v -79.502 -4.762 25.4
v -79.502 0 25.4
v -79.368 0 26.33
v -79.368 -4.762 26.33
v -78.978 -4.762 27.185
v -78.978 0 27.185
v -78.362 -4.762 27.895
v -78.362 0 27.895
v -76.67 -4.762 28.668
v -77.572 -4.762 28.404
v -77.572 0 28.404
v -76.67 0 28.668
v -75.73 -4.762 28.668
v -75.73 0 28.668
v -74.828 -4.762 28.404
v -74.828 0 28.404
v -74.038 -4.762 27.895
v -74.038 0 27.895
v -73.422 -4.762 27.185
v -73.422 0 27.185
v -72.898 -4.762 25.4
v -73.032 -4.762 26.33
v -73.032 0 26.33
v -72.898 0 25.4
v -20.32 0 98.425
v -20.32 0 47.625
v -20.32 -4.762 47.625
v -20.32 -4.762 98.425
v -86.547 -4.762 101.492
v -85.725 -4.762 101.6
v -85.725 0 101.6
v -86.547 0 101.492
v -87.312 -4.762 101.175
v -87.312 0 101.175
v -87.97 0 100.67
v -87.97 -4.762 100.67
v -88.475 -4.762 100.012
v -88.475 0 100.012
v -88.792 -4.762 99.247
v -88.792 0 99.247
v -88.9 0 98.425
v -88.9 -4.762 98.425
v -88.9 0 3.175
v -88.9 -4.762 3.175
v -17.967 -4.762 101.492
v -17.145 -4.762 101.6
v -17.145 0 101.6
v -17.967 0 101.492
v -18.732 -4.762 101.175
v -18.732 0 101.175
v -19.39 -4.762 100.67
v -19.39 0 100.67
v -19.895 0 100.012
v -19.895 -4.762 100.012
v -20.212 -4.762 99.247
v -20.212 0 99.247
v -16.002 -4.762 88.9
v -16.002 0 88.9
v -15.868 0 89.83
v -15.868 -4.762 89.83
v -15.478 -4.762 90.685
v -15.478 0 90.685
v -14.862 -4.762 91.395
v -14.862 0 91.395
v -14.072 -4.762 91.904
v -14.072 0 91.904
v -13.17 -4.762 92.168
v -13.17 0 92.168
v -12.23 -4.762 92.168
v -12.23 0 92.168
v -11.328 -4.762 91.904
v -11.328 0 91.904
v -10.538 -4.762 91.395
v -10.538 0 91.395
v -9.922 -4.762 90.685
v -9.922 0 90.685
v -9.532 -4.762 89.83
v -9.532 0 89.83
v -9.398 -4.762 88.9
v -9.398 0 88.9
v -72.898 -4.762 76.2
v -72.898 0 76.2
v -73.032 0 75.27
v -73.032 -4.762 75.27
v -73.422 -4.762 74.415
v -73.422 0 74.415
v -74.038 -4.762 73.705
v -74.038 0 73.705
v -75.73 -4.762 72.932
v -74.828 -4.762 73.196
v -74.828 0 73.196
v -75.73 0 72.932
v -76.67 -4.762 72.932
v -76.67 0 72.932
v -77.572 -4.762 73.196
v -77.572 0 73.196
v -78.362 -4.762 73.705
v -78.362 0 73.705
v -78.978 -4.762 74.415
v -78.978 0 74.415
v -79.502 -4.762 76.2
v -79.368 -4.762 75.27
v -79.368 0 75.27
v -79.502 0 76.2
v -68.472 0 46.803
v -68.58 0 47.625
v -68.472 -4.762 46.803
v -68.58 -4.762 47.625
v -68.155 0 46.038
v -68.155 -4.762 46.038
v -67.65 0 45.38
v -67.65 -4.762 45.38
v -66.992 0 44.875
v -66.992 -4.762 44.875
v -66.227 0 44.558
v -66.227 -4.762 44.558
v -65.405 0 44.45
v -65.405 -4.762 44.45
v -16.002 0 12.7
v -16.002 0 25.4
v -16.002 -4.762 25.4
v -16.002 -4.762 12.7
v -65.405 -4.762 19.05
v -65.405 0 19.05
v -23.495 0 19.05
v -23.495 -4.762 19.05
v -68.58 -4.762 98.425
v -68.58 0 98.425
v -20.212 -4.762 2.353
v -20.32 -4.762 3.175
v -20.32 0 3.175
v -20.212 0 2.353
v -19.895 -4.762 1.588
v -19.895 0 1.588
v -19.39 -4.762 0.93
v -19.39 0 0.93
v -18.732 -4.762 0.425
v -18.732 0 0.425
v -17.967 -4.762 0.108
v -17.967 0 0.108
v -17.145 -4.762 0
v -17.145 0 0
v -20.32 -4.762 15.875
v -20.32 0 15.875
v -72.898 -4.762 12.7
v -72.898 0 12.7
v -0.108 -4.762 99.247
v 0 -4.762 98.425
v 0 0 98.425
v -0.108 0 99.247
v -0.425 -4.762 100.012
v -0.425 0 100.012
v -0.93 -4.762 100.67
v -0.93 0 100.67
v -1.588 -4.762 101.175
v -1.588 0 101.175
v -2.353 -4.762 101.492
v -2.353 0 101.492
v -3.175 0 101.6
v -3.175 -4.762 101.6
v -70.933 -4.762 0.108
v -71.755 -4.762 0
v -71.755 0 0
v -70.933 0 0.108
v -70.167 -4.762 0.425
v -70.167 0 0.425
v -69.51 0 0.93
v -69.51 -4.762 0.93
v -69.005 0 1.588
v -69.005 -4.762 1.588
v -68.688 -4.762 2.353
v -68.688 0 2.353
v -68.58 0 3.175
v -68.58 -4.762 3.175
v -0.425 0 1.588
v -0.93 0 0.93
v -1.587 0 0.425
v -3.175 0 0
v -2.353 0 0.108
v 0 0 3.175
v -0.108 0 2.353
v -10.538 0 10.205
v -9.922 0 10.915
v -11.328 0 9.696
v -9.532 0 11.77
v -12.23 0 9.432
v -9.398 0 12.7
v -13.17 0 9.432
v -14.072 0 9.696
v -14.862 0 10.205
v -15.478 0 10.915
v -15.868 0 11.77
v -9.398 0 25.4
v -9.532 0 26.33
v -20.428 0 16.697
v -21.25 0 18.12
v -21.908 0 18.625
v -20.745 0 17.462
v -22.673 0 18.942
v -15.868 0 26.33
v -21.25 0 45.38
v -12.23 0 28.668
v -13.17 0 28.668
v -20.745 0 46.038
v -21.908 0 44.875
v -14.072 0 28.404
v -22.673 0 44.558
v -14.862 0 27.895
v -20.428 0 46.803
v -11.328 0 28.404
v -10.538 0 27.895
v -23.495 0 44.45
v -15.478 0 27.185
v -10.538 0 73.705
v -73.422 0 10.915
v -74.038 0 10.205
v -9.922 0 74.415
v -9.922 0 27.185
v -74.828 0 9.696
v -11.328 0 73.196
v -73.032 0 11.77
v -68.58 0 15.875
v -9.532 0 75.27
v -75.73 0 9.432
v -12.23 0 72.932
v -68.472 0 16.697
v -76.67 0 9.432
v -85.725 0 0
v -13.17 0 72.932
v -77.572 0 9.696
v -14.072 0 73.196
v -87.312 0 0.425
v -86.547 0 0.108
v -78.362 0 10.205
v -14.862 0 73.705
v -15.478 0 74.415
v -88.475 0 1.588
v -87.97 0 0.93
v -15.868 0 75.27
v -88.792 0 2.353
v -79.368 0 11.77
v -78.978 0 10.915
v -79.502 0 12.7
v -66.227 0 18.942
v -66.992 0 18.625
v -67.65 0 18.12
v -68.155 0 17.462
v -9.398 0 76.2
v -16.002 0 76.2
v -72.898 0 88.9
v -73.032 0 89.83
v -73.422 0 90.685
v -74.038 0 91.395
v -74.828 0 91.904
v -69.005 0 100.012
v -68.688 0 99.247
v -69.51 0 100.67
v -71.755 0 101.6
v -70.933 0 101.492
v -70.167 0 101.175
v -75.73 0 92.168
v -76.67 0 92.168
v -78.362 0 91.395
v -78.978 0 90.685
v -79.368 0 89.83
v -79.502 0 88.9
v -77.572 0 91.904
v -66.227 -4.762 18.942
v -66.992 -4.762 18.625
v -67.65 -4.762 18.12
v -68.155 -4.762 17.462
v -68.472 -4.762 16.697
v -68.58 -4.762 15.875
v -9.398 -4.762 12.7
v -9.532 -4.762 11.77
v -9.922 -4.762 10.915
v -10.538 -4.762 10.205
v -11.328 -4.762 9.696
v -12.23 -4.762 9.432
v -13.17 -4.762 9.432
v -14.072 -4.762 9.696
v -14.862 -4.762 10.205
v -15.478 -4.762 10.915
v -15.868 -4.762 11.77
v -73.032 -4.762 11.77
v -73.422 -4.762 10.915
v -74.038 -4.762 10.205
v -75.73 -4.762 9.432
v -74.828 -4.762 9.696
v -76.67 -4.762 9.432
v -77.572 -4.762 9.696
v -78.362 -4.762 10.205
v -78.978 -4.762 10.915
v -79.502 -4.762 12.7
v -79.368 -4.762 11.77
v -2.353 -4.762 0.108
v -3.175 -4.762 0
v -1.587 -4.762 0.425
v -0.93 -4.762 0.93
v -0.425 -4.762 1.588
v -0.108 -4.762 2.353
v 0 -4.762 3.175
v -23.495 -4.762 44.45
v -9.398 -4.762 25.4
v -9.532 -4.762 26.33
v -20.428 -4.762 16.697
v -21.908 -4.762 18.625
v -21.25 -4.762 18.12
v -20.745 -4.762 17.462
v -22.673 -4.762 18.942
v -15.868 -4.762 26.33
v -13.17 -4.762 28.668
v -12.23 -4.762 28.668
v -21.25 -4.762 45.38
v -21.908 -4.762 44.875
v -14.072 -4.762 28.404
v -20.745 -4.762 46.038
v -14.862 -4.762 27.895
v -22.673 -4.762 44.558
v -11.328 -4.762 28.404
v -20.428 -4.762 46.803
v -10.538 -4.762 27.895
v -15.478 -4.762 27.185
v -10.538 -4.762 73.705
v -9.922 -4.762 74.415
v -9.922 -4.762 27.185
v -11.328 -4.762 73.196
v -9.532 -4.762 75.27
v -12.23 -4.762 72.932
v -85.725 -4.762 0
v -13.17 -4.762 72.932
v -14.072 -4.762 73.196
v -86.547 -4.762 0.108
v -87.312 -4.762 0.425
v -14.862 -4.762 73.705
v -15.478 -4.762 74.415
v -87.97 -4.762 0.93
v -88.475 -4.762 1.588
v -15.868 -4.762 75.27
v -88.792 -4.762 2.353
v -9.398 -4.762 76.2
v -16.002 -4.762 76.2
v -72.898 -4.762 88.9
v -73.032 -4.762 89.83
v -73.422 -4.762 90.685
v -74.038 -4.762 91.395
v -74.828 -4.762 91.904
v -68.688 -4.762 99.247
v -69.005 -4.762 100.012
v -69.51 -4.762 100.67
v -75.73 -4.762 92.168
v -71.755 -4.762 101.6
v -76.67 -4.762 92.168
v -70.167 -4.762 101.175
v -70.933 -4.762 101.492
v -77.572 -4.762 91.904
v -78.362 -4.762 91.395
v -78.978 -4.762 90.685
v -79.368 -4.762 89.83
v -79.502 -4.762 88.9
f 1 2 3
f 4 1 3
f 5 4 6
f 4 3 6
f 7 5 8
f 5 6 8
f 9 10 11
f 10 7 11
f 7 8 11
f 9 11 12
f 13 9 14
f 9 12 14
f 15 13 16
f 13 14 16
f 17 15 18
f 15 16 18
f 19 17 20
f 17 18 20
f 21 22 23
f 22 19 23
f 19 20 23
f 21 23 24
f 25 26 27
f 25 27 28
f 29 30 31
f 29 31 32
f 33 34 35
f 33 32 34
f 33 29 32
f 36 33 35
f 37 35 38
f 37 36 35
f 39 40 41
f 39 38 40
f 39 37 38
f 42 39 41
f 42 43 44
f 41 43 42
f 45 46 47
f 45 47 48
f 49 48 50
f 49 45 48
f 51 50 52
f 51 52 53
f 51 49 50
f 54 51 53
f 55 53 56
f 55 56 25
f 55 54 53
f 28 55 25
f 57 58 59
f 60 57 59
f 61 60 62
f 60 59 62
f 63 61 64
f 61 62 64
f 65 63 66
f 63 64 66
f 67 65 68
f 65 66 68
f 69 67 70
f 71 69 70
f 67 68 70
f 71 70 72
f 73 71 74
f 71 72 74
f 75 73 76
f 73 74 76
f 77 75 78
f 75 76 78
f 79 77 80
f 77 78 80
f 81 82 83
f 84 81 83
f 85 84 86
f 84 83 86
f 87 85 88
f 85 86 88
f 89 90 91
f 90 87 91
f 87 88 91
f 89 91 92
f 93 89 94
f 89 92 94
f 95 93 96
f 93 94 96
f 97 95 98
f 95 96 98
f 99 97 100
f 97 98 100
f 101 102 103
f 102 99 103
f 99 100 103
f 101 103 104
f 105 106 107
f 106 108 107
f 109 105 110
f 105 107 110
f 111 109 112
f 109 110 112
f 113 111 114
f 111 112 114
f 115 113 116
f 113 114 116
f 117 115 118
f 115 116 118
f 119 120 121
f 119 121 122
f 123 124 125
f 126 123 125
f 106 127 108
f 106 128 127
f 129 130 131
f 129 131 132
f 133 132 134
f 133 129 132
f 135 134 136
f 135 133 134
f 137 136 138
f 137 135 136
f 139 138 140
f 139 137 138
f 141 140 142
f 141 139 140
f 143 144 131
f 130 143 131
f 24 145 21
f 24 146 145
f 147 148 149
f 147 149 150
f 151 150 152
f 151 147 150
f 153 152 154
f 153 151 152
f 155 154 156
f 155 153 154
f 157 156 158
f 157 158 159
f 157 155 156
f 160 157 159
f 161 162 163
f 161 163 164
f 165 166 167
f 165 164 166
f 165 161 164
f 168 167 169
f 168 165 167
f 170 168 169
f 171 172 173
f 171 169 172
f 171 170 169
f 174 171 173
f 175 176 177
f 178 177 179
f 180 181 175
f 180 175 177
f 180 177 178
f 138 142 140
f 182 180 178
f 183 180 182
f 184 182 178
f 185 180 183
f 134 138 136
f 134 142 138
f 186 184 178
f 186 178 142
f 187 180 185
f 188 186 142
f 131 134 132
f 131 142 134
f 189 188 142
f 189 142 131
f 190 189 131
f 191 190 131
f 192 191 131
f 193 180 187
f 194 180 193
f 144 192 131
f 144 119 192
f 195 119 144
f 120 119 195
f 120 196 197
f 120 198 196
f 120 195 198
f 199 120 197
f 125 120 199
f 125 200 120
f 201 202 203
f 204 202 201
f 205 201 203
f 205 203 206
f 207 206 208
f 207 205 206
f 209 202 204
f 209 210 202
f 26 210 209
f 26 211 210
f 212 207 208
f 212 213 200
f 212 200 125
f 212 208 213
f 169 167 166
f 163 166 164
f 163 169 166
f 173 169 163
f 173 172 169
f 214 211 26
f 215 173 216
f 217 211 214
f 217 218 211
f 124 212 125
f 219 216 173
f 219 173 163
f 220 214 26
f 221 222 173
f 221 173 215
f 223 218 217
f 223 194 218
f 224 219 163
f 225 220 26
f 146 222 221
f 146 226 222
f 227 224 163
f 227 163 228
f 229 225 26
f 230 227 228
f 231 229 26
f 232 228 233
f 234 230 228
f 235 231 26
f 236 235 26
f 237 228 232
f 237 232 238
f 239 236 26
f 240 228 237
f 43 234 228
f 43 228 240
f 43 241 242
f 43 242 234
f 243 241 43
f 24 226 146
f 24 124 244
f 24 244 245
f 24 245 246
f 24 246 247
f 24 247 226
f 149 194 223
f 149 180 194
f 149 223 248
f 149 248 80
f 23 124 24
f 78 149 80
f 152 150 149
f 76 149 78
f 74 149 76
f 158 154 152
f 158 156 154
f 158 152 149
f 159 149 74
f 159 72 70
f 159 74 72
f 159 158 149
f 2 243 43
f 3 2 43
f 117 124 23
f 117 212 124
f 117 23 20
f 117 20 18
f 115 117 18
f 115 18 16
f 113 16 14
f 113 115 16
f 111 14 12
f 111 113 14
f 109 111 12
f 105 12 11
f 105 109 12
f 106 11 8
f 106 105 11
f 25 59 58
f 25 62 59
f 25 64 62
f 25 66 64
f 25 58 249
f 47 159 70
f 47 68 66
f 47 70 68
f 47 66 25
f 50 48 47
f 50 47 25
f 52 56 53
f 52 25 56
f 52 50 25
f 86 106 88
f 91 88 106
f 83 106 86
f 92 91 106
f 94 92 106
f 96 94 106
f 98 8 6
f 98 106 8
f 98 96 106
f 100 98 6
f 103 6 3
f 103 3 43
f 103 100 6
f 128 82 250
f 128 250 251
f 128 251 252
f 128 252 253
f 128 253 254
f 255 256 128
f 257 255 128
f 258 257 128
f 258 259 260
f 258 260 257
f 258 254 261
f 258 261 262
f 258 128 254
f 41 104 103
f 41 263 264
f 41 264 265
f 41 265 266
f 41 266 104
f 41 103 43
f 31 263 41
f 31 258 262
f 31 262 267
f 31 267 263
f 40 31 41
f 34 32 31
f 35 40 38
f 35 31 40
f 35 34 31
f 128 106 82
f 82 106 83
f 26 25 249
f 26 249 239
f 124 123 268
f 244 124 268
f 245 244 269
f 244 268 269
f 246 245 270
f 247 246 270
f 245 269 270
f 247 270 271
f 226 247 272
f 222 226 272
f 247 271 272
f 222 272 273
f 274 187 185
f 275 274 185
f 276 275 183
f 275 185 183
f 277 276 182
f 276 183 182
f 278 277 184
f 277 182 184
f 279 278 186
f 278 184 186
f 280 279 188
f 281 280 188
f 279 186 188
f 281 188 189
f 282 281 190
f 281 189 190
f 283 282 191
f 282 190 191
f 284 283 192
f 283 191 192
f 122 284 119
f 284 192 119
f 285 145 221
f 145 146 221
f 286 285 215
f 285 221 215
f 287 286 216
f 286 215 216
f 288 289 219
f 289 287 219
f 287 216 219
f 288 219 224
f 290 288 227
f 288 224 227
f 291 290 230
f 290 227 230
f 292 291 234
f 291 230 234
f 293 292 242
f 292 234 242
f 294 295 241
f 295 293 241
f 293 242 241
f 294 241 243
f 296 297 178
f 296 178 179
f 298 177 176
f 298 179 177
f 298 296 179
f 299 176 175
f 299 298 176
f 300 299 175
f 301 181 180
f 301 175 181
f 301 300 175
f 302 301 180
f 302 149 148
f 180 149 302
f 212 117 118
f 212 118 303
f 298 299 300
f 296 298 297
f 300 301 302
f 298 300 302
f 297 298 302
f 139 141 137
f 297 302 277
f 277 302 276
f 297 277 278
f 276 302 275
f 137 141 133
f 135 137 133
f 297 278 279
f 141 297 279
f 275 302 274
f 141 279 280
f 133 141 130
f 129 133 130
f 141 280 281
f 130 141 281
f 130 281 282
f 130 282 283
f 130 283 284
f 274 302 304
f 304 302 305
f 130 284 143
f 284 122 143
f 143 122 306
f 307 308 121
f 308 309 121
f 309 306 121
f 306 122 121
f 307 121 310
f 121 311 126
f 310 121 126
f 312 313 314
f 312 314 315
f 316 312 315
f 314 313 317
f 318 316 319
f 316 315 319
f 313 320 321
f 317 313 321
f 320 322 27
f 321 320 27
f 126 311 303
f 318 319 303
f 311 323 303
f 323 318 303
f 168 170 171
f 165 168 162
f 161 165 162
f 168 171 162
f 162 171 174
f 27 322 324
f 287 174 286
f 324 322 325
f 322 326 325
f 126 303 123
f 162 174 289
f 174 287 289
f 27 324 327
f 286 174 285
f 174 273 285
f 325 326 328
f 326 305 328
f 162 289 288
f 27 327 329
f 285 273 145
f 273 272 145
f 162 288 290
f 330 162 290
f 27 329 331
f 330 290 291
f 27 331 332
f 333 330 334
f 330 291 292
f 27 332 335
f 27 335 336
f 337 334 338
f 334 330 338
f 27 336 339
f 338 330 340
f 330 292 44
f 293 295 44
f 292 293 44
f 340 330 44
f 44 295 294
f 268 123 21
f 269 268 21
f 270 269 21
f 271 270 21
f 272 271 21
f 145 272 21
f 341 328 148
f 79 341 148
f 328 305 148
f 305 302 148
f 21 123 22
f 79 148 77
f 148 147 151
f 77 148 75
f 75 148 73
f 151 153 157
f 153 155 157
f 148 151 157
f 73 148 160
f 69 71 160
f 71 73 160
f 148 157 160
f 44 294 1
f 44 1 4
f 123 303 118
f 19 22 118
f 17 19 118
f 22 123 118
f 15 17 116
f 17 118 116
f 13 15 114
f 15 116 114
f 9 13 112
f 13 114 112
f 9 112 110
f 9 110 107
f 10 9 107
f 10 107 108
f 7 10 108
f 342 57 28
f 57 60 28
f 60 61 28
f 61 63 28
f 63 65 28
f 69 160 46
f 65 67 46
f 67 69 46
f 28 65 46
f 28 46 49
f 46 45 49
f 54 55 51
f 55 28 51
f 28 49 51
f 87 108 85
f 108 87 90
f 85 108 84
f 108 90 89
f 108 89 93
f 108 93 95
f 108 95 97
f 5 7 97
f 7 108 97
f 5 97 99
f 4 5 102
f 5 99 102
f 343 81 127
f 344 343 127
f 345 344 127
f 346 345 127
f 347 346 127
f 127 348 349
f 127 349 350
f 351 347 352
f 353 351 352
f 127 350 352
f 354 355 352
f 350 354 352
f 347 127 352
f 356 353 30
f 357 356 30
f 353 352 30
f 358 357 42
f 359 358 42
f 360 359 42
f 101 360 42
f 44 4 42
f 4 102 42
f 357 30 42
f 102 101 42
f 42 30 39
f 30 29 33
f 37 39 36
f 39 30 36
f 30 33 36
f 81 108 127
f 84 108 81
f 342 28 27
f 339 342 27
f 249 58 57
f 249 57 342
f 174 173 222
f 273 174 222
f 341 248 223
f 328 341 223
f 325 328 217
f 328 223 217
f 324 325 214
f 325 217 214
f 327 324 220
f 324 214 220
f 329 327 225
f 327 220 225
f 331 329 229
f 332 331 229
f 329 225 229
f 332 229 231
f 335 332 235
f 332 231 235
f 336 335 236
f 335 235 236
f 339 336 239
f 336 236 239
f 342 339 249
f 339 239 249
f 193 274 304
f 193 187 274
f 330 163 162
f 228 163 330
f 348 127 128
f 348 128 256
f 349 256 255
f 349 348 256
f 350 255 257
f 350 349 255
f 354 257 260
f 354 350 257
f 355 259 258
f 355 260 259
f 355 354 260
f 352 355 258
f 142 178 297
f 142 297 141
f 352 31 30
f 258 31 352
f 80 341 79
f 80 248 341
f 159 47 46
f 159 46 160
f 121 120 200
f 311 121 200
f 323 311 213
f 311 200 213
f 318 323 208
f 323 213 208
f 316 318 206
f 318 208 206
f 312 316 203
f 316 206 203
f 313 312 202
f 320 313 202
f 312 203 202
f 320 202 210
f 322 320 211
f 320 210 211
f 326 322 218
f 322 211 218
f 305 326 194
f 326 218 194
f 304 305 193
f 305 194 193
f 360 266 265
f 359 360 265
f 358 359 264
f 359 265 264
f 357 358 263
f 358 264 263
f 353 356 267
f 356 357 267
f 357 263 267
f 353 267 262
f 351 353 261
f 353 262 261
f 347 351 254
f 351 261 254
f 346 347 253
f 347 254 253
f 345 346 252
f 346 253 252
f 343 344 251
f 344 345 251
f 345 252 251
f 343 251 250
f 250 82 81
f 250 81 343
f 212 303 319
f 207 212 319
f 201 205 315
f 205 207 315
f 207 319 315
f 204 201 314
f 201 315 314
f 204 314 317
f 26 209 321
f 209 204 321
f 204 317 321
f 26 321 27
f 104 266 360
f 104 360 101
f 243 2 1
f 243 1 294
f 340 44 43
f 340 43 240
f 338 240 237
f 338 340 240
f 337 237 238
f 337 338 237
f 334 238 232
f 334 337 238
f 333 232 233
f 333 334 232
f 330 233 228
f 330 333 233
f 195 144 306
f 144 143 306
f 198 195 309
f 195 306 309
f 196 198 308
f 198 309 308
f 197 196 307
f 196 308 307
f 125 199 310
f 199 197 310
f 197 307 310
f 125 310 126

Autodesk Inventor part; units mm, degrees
ref_plane "YZ Plane" through (0, 0, 0) normal (1, 0, 0) x (0, 1, 0)
ref_plane "XZ Plane" through (0, 0, 0) normal (0, 1, 0) x (-1, 0, 0)
ref_plane "XY Plane" through (0, 0, 0) normal (0, 0, 1) x (1, 0, 0)
sketch "Sketch1" plane through (0, 0, 0) normal (0, 1, 0) x (-1, 0, 0)
  line L0 (0, 0) -> (20.32, 0)
  line L1 (0, 101.6) -> (0, 0)
  line L2 (44.45, 44.45) -> (20.32, 44.45)
  line L3 (20.32, 44.45) -> (20.32, 101.6)
  line L4 (44.45, 44.45) -> (44.45, 19.05)
  line L5 (20.32, 101.6) -> (0, 101.6)
  line L6 (16.002, 88.9) -> (16.002, 76.2)
  line L7 (9.398, 76.2) -> (9.398, 88.9)
  arc A0 (16.002, 88.9) -> (9.398, 88.9) centre (12.7, 88.9) ccw
  arc A1 (9.398, 76.2) -> (16.002, 76.2) centre (12.7, 76.2) ccw
  line L8 (16.002, 25.4) -> (16.002, 12.7)
  line L9 (9.398, 12.7) -> (9.398, 25.4)
  arc A2 (16.002, 25.4) -> (9.398, 25.4) centre (12.7, 25.4) ccw
  arc A3 (9.398, 12.7) -> (16.002, 12.7) centre (12.7, 12.7) ccw
  line L10 (44.45, 19.05) -> (20.32, 19.05)
  line L11 (20.32, 19.05) -> (20.32, 0)
  dimension "d1" = 101.6
  dimension "d8" = 44.45
  dimension "d11" = 6.604
  dimension "d14" = 12.7
  dimension "d15" = 12.7
  dimension "d18" = 12.7
  dimension "d19" = 20.32
  dimension "d21" = 31.75
  dimension "d23" = 25.4
  dimension "d24" = 19.05
  dimension "d25" = 63.5
  dimension "d26" = 6.604
extrude "Extrusion1" add sketch "Sketch1" against normal blind 4.7625
fillet "Fillet1" radius 3.175 6 edges at (-20.32, -2.3813, 44.45) (-20.32, -2.3813, 101.6) (0, -2.3813, 101.6) (0, -2.3813, 0) (-20.32, -2.3813, 0) (-20.32, -2.3813, 19.05)
mirror "Mirror2" about plane through (-44.45, 0, 44.45) normal (-1, 0, 0)
equation "\"d26\" = d11"
properties part number "torchMount_back"
